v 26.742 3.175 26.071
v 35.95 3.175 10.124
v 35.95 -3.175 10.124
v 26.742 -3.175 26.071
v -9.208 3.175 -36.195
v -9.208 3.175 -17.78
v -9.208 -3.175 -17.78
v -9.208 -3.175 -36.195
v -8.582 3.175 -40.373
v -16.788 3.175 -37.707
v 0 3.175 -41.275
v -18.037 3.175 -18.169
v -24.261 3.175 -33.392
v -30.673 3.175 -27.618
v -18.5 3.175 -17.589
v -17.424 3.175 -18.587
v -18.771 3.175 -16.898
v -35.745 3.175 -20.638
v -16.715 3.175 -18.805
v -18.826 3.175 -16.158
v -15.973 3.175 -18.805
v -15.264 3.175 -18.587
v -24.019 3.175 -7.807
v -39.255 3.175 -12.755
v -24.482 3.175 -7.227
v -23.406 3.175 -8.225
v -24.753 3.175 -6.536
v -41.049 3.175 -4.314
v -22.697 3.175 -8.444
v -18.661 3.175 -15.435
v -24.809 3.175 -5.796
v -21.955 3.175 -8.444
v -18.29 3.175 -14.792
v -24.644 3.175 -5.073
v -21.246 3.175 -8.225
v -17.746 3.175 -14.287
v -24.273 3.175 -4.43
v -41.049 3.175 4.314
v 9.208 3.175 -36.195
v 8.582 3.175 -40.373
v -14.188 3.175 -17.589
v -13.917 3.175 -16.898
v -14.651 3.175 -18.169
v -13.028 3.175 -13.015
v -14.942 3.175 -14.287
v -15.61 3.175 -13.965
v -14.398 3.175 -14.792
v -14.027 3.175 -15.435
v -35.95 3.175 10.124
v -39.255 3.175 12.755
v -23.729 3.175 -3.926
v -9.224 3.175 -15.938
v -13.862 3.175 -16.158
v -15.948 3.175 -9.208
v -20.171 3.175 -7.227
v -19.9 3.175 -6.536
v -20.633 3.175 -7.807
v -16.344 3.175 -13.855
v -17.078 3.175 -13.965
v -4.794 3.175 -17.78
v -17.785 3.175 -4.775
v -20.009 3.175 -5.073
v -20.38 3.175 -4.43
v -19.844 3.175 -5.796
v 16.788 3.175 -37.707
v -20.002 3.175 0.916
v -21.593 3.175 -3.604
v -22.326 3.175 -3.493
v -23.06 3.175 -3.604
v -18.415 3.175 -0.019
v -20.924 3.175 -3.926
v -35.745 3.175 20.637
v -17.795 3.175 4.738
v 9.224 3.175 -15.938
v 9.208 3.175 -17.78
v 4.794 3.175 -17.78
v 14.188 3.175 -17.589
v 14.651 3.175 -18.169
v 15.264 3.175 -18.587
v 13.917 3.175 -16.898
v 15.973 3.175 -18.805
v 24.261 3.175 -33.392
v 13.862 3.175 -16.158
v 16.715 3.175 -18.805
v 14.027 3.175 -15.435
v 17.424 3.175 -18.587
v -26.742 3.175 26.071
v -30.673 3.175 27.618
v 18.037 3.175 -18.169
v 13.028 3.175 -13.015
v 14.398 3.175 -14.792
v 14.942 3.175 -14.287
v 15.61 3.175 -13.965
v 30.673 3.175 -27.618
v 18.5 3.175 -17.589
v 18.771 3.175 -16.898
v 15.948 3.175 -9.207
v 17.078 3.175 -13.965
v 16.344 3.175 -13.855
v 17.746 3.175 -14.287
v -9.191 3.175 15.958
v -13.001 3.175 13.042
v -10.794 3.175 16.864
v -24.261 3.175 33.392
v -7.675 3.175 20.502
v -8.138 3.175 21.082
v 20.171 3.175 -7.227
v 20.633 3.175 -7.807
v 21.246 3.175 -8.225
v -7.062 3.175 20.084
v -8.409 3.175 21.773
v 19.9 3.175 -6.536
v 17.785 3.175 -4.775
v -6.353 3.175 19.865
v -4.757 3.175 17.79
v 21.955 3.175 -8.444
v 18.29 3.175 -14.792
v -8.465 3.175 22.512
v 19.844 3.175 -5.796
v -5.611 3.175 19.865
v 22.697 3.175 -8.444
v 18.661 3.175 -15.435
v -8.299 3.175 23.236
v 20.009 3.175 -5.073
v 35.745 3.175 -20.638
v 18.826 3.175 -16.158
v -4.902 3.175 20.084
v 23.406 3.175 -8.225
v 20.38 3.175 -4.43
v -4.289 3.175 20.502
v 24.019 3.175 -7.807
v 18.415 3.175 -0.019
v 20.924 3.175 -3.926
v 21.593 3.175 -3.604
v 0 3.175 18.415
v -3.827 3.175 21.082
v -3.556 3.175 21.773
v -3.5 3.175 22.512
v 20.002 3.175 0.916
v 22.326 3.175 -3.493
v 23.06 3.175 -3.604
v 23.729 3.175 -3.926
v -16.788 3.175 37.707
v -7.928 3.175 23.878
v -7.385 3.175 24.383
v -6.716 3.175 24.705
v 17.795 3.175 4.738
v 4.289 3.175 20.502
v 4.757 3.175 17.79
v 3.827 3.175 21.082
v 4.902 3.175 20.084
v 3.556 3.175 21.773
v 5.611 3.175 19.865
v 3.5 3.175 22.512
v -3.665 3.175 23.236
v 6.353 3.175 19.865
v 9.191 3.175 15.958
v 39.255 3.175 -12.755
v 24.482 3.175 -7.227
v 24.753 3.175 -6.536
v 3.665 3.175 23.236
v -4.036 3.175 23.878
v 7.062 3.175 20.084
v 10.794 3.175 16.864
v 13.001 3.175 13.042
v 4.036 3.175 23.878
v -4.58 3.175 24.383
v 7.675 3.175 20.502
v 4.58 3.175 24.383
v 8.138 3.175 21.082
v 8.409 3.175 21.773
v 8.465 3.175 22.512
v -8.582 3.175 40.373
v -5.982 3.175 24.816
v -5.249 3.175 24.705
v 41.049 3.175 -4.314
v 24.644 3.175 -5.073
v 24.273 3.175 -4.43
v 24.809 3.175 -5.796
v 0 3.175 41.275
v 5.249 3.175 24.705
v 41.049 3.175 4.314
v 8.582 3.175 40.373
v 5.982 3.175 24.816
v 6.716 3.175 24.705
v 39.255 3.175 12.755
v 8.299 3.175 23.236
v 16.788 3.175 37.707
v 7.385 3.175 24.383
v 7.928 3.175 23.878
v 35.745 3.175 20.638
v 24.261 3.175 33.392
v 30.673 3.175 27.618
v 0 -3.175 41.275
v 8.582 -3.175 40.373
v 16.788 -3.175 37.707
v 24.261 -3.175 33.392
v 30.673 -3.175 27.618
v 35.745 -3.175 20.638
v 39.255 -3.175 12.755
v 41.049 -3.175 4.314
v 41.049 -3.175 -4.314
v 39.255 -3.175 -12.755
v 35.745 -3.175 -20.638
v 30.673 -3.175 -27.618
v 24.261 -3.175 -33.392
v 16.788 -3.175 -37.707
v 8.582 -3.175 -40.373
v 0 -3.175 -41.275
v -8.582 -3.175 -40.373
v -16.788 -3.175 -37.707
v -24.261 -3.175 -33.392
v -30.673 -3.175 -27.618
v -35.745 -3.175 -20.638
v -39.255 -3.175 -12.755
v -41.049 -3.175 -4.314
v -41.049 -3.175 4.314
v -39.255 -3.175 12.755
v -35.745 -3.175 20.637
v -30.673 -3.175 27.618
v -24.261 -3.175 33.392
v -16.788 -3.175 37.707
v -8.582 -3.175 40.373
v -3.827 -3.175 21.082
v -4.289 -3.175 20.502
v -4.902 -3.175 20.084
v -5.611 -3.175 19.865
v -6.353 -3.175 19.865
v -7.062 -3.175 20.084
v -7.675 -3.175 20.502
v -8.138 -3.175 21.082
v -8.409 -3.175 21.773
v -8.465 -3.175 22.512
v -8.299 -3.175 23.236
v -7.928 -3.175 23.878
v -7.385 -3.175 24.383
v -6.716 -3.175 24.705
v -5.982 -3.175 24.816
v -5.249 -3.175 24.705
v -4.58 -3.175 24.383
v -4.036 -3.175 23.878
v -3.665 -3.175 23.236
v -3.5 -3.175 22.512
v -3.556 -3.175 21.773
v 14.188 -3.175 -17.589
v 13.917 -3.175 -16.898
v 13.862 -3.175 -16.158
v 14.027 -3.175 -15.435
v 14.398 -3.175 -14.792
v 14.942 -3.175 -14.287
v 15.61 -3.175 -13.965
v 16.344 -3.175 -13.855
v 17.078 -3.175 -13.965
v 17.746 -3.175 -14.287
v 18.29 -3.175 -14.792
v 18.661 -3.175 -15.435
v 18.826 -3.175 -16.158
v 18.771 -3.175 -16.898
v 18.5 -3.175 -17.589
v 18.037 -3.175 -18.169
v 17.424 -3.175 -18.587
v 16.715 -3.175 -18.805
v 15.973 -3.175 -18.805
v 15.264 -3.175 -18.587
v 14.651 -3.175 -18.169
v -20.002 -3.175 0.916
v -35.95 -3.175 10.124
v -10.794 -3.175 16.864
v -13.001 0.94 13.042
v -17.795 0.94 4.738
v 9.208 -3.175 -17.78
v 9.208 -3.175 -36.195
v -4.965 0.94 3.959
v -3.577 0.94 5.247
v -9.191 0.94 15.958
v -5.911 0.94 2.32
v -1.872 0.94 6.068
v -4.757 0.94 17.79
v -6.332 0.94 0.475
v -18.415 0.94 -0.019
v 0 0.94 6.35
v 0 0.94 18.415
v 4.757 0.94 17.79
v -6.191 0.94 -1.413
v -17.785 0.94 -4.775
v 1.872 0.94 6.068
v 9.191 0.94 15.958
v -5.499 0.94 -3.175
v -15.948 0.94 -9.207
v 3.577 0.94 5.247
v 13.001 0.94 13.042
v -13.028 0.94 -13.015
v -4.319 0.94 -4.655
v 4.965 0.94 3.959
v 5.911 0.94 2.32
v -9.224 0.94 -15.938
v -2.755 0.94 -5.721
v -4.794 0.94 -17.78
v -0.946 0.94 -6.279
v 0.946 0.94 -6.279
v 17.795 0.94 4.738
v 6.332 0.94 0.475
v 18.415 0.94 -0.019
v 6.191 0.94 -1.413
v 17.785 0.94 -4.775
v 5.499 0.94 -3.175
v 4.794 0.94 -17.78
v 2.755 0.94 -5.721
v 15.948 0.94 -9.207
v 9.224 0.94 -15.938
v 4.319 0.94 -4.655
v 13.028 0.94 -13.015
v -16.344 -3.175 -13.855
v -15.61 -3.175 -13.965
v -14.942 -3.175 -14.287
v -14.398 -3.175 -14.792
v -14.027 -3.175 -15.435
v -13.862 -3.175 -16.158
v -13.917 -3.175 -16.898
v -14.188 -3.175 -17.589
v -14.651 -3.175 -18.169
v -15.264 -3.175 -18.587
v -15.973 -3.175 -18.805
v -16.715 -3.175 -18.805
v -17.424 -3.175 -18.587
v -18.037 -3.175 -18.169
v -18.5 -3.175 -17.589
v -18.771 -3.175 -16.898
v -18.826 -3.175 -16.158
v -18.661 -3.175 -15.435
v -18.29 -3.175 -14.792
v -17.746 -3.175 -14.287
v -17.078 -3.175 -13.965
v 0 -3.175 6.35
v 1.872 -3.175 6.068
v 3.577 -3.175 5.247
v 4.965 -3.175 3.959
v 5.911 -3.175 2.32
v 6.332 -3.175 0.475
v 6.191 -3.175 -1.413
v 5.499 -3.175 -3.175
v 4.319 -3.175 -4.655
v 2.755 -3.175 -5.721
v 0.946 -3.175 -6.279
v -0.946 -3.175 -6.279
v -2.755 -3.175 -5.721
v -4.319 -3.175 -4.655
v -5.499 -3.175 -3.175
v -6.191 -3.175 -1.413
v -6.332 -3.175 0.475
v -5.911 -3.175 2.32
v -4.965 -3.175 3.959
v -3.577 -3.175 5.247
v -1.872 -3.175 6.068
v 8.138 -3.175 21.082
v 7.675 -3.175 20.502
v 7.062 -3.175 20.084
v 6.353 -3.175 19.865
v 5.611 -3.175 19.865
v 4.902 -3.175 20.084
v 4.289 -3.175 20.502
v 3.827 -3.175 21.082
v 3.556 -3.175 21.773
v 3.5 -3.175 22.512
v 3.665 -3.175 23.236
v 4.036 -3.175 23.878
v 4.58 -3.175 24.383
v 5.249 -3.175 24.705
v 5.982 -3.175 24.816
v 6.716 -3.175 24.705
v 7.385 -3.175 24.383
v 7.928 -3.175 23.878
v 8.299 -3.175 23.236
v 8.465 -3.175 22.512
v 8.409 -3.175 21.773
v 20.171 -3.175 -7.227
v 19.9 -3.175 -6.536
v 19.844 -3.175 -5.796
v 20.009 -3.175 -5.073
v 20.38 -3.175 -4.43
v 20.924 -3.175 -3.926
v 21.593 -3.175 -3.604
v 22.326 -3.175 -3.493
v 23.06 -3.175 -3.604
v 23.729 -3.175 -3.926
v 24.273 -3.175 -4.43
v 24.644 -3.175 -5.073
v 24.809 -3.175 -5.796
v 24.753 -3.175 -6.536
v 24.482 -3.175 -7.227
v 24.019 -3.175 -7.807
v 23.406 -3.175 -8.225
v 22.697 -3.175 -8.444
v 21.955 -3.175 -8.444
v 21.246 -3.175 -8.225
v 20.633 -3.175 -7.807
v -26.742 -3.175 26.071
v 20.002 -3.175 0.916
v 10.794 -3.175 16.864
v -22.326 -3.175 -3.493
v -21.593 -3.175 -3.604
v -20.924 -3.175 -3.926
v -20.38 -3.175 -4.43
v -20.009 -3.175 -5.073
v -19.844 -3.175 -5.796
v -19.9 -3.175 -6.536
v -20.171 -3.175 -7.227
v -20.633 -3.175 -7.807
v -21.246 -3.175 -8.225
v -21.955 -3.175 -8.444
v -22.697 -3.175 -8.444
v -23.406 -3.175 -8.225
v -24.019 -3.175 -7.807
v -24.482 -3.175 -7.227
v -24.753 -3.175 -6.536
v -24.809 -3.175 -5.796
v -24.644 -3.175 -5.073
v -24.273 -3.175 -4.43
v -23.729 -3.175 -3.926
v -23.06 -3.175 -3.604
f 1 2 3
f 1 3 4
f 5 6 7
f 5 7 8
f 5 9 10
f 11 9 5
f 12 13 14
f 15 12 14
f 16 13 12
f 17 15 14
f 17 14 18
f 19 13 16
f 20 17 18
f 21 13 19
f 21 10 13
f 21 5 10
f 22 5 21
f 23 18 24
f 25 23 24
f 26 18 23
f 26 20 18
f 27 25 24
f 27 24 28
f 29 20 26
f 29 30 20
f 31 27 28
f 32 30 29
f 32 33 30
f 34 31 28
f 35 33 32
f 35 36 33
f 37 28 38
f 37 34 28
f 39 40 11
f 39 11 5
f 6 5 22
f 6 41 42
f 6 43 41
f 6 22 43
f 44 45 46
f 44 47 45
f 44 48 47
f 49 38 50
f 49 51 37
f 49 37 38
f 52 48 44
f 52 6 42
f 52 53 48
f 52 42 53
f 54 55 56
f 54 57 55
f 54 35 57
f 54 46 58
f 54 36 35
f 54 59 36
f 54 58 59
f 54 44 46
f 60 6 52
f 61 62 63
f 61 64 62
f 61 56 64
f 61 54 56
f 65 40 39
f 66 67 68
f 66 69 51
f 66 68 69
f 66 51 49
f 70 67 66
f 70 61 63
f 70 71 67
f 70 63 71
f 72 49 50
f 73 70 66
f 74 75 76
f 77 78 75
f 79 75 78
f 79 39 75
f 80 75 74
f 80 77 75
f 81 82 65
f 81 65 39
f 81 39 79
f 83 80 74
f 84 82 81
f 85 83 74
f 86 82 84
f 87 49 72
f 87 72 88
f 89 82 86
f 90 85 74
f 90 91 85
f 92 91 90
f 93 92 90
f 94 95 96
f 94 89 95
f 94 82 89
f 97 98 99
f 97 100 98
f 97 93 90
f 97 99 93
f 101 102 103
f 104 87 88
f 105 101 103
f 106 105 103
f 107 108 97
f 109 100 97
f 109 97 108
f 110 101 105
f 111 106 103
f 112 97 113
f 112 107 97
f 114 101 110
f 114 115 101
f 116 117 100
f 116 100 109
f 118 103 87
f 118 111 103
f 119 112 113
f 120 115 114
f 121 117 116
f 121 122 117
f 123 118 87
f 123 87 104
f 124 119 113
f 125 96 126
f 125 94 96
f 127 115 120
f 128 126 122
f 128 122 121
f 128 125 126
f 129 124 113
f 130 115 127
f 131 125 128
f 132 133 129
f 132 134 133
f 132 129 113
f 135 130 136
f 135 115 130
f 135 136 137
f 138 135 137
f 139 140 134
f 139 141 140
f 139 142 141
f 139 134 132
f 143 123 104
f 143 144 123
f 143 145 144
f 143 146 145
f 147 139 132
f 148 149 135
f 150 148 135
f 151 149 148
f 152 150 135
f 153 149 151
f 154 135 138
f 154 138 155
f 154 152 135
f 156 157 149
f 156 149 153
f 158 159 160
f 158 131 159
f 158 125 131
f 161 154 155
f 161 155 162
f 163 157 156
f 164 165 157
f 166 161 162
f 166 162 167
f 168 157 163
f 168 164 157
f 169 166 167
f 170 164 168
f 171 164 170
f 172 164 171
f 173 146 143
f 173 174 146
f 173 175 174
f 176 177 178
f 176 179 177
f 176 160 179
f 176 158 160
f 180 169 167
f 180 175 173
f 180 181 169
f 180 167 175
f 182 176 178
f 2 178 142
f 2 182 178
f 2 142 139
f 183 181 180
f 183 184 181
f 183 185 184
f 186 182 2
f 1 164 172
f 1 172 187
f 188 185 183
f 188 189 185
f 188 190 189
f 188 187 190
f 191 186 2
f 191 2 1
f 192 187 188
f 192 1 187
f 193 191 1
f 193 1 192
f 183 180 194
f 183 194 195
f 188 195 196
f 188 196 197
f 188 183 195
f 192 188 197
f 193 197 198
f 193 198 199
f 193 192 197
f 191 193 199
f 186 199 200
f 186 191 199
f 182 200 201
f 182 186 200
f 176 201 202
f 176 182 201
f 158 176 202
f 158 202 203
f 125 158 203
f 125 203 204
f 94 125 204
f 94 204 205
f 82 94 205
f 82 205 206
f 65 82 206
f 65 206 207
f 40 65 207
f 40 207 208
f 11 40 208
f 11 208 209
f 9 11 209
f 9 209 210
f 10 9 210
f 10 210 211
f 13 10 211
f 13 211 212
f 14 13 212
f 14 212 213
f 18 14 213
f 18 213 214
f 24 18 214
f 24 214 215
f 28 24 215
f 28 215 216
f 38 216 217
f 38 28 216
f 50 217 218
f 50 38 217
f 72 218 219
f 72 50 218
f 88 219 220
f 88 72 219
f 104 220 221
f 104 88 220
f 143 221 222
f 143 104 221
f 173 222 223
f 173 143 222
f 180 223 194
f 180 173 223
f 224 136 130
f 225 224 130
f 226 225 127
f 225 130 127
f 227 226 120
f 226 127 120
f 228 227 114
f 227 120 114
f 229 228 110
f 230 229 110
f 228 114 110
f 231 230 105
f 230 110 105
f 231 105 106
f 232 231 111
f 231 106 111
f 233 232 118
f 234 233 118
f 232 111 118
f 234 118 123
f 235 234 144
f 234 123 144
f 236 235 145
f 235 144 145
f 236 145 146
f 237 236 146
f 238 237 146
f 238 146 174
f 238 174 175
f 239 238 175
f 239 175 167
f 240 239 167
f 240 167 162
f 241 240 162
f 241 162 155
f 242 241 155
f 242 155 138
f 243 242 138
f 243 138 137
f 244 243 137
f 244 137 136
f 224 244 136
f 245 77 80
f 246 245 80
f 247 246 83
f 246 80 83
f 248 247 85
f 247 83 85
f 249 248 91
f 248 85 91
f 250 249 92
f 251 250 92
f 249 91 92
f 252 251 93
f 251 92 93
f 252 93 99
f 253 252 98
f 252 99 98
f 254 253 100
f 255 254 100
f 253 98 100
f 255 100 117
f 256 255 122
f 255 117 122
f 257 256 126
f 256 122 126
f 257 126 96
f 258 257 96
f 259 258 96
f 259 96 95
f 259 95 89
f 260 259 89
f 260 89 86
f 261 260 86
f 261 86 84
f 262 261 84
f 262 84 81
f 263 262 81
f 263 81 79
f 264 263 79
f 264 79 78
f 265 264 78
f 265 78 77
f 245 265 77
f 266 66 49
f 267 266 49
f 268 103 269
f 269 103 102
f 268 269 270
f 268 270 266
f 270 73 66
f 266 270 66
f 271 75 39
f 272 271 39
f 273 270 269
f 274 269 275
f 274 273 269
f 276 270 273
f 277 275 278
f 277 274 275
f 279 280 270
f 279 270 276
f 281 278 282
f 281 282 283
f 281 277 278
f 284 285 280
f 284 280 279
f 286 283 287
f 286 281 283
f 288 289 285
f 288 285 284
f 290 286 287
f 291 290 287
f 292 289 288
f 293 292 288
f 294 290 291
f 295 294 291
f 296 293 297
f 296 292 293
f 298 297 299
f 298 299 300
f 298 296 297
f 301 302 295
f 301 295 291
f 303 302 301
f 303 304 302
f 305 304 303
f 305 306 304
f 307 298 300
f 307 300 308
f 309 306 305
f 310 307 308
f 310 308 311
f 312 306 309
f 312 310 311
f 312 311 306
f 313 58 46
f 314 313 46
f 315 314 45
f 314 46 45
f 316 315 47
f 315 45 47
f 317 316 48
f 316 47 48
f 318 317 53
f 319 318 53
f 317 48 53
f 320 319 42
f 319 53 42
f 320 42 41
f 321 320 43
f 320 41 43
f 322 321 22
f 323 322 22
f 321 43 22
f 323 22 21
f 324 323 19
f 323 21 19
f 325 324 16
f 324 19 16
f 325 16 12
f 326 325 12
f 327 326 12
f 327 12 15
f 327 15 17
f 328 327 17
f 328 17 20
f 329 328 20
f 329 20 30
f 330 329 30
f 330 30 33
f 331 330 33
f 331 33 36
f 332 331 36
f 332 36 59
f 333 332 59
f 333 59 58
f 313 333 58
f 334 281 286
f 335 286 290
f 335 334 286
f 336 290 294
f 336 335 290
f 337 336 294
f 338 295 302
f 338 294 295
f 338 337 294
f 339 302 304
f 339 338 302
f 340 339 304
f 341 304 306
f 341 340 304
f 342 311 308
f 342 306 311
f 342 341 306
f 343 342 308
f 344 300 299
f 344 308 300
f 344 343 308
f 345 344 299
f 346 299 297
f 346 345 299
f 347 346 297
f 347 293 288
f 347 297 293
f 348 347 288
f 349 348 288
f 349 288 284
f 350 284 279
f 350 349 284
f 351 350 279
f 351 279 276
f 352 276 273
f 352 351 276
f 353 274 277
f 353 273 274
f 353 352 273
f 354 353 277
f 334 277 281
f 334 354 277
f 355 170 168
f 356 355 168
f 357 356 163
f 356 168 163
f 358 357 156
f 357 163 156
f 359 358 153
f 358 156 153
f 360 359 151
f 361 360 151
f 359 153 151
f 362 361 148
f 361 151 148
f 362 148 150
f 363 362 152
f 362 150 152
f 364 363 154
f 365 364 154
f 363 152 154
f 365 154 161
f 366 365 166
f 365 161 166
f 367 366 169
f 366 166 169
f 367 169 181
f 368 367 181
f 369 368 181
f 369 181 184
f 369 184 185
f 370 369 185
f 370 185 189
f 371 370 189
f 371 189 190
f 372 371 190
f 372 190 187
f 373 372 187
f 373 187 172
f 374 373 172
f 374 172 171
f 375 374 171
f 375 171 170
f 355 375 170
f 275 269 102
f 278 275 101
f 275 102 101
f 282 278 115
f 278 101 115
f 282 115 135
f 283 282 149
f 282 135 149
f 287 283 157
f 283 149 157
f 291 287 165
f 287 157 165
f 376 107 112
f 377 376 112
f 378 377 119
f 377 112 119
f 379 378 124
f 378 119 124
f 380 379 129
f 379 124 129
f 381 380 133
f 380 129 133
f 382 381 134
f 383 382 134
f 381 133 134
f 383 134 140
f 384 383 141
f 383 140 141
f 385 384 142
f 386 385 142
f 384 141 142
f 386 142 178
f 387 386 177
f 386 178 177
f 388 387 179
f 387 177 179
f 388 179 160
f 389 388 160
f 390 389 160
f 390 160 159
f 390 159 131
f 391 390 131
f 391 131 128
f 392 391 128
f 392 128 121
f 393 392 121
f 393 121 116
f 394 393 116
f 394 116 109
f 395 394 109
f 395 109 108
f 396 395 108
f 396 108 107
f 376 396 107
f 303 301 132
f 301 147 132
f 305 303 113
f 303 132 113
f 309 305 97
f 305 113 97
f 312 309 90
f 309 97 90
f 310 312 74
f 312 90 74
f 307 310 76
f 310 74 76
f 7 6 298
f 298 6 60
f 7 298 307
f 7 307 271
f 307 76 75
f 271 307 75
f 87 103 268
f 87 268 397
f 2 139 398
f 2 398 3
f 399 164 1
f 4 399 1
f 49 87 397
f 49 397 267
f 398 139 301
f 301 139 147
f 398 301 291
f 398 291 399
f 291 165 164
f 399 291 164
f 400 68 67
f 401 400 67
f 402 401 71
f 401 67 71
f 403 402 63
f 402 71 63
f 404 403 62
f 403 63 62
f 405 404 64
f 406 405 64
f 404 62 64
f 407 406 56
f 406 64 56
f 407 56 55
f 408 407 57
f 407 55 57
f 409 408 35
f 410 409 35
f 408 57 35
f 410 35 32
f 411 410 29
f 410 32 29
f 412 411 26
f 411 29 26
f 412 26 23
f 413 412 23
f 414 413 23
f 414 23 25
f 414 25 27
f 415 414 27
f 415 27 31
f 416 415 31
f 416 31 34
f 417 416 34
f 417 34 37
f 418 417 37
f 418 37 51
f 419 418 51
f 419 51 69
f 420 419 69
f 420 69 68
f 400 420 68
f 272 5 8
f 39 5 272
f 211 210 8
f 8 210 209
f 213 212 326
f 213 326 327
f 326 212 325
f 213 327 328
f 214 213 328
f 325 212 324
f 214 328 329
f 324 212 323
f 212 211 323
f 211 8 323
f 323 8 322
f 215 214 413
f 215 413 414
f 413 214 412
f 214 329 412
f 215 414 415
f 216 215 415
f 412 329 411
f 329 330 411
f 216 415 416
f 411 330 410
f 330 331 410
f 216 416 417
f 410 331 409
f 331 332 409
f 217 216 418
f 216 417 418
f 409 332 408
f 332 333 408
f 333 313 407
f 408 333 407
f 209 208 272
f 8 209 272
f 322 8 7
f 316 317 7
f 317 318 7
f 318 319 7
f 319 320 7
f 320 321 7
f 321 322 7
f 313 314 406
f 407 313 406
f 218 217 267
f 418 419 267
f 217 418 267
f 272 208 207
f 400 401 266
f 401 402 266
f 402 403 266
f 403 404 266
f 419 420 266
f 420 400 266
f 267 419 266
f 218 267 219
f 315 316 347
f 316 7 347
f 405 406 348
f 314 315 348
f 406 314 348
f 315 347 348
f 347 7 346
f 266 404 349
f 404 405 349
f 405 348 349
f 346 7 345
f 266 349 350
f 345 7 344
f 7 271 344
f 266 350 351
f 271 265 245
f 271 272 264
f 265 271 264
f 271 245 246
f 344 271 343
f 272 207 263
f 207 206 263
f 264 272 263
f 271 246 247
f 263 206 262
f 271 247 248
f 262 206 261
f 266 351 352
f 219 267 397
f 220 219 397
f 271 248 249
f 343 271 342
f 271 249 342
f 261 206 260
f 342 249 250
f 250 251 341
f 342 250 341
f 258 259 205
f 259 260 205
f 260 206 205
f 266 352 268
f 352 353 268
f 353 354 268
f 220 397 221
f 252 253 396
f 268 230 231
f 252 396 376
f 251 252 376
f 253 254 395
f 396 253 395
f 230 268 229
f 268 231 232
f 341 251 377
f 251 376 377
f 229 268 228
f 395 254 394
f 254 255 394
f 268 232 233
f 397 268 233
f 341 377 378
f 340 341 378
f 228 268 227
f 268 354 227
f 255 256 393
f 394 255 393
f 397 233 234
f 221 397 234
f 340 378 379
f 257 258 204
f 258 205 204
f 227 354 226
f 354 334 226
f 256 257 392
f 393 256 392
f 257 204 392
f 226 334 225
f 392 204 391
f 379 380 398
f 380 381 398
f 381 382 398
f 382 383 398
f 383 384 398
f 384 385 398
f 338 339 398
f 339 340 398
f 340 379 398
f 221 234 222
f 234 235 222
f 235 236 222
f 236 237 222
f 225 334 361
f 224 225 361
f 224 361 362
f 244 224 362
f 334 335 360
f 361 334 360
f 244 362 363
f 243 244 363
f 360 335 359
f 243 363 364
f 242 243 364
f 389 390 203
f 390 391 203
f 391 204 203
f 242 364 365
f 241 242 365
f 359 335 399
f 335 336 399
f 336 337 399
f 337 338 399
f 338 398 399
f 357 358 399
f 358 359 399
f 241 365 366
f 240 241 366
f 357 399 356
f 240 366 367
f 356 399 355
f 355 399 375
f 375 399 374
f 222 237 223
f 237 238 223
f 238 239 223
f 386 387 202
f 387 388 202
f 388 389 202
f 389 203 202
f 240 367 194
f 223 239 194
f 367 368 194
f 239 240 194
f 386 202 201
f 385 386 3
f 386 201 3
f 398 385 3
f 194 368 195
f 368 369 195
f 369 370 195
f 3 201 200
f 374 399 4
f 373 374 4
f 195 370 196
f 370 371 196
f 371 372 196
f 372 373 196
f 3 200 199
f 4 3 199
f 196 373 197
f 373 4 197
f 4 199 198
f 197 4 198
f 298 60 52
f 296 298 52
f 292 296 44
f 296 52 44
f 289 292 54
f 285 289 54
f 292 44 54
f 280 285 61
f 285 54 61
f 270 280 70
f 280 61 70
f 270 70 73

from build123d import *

# Parameters (mm, degrees)
SKETCH1_R           = 44.45
SKETCH1_R_2         = 6.35
BOSS_EXTRUDE1_DEPTH = 3.175
SKETCH5_W           = 18.415
SKETCH5_H           = 18.415
CUT_EXTRUDE4_DEPTH  = 64.181702256
CIRPATTERN2_COUNT   = 3
SKETCH3_R           = 44.45
SKETCH3_R_2         = 41.275
CUT_EXTRUDE2_DEPTH  = 64.181702256
SKETCH6_R           = 18.415
CUT_EXTRUDE5_DEPTH  = 2.2352
SKETCH7_R           = 2.4892
CUT_EXTRUDE6_DEPTH  = 59.716043378
CIRPATTERN3_COUNT   = 3


with BuildPart() as part:
    # Sketch1 → Boss-Extrude1 (new, symmetric)
    with BuildSketch(Plane(origin=(0, 0, 0), x_dir=(1, 0, 0), z_dir=(0, 1, 0))):
        with Locations(Location((0, 0, 0), (0, 0, 270))):
            Circle(SKETCH1_R)
        with Locations(Location((0, 0, 0), (0, 0, 270))):
            Circle(SKETCH1_R_2, mode=Mode.SUBTRACT)
    extrude(amount=BOSS_EXTRUDE1_DEPTH, both=True)

    # Sketch5 → Cut-Extrude4 (cut, through all)
    with BuildSketch(Plane(origin=(0, 3.175, 0), x_dir=(1, 0, 0), z_dir=(0, 1, 0))):
        with Locations((0, 26.9875)):
            Rectangle(SKETCH5_W, SKETCH5_H)
    cut_extrude4 = extrude(amount=-CUT_EXTRUDE4_DEPTH, mode=Mode.SUBTRACT)

    # CirPattern2: Cut-Extrude4 ×3 about axis
    cirpattern2_axis = Axis((0, 0, 0), (0, 1, 0))
    for i in range(1, CIRPATTERN2_COUNT):
        add(cut_extrude4.rotate(cirpattern2_axis, i * 360 / CIRPATTERN2_COUNT), mode=Mode.SUBTRACT)

    # Sketch3 → Cut-Extrude2 (cut, through all)
    with BuildSketch(Plane(origin=(0, 3.175, 0), x_dir=(1, 0, 0), z_dir=(0, 1, 0))):
        Circle(SKETCH3_R)
        with Locations(Location((0, 0, 0), (0, 0, 270))):
            Circle(SKETCH3_R_2, mode=Mode.SUBTRACT)
    extrude(amount=-CUT_EXTRUDE2_DEPTH, mode=Mode.SUBTRACT)

    # Sketch6 → Cut-Extrude5 (cut)
    with BuildSketch(Plane(origin=(0, 3.175, 0), x_dir=(1, 0, 0), z_dir=(0, 1, 0))):
        Circle(SKETCH6_R)
    extrude(amount=-CUT_EXTRUDE5_DEPTH, mode=Mode.SUBTRACT)

    # Sketch7 → Cut-Extrude6 (cut, through all)
    with BuildSketch(Plane(origin=(0, 3.175, 0), x_dir=(1, 0, 0), z_dir=(0, 1, 0))):
        with Locations(Location((-16.34406614, 16.34406614, 0), (0, 0, 270))):
            Circle(SKETCH7_R)
        with Locations(Location((-22.326409549, 5.982343408, 0), (0, 0, 270))):
            Circle(SKETCH7_R)
    cut_extrude6 = extrude(amount=-CUT_EXTRUDE6_DEPTH, mode=Mode.SUBTRACT)

    # CirPattern3: Cut-Extrude6 ×3 about axis
    cirpattern3_axis = Axis((0, 0, 0), (0, 1, 0))
    for i in range(1, CIRPATTERN3_COUNT):
        add(cut_extrude6.rotate(cirpattern3_axis, i * 360 / CIRPATTERN3_COUNT), mode=Mode.SUBTRACT)


solid = part.part
